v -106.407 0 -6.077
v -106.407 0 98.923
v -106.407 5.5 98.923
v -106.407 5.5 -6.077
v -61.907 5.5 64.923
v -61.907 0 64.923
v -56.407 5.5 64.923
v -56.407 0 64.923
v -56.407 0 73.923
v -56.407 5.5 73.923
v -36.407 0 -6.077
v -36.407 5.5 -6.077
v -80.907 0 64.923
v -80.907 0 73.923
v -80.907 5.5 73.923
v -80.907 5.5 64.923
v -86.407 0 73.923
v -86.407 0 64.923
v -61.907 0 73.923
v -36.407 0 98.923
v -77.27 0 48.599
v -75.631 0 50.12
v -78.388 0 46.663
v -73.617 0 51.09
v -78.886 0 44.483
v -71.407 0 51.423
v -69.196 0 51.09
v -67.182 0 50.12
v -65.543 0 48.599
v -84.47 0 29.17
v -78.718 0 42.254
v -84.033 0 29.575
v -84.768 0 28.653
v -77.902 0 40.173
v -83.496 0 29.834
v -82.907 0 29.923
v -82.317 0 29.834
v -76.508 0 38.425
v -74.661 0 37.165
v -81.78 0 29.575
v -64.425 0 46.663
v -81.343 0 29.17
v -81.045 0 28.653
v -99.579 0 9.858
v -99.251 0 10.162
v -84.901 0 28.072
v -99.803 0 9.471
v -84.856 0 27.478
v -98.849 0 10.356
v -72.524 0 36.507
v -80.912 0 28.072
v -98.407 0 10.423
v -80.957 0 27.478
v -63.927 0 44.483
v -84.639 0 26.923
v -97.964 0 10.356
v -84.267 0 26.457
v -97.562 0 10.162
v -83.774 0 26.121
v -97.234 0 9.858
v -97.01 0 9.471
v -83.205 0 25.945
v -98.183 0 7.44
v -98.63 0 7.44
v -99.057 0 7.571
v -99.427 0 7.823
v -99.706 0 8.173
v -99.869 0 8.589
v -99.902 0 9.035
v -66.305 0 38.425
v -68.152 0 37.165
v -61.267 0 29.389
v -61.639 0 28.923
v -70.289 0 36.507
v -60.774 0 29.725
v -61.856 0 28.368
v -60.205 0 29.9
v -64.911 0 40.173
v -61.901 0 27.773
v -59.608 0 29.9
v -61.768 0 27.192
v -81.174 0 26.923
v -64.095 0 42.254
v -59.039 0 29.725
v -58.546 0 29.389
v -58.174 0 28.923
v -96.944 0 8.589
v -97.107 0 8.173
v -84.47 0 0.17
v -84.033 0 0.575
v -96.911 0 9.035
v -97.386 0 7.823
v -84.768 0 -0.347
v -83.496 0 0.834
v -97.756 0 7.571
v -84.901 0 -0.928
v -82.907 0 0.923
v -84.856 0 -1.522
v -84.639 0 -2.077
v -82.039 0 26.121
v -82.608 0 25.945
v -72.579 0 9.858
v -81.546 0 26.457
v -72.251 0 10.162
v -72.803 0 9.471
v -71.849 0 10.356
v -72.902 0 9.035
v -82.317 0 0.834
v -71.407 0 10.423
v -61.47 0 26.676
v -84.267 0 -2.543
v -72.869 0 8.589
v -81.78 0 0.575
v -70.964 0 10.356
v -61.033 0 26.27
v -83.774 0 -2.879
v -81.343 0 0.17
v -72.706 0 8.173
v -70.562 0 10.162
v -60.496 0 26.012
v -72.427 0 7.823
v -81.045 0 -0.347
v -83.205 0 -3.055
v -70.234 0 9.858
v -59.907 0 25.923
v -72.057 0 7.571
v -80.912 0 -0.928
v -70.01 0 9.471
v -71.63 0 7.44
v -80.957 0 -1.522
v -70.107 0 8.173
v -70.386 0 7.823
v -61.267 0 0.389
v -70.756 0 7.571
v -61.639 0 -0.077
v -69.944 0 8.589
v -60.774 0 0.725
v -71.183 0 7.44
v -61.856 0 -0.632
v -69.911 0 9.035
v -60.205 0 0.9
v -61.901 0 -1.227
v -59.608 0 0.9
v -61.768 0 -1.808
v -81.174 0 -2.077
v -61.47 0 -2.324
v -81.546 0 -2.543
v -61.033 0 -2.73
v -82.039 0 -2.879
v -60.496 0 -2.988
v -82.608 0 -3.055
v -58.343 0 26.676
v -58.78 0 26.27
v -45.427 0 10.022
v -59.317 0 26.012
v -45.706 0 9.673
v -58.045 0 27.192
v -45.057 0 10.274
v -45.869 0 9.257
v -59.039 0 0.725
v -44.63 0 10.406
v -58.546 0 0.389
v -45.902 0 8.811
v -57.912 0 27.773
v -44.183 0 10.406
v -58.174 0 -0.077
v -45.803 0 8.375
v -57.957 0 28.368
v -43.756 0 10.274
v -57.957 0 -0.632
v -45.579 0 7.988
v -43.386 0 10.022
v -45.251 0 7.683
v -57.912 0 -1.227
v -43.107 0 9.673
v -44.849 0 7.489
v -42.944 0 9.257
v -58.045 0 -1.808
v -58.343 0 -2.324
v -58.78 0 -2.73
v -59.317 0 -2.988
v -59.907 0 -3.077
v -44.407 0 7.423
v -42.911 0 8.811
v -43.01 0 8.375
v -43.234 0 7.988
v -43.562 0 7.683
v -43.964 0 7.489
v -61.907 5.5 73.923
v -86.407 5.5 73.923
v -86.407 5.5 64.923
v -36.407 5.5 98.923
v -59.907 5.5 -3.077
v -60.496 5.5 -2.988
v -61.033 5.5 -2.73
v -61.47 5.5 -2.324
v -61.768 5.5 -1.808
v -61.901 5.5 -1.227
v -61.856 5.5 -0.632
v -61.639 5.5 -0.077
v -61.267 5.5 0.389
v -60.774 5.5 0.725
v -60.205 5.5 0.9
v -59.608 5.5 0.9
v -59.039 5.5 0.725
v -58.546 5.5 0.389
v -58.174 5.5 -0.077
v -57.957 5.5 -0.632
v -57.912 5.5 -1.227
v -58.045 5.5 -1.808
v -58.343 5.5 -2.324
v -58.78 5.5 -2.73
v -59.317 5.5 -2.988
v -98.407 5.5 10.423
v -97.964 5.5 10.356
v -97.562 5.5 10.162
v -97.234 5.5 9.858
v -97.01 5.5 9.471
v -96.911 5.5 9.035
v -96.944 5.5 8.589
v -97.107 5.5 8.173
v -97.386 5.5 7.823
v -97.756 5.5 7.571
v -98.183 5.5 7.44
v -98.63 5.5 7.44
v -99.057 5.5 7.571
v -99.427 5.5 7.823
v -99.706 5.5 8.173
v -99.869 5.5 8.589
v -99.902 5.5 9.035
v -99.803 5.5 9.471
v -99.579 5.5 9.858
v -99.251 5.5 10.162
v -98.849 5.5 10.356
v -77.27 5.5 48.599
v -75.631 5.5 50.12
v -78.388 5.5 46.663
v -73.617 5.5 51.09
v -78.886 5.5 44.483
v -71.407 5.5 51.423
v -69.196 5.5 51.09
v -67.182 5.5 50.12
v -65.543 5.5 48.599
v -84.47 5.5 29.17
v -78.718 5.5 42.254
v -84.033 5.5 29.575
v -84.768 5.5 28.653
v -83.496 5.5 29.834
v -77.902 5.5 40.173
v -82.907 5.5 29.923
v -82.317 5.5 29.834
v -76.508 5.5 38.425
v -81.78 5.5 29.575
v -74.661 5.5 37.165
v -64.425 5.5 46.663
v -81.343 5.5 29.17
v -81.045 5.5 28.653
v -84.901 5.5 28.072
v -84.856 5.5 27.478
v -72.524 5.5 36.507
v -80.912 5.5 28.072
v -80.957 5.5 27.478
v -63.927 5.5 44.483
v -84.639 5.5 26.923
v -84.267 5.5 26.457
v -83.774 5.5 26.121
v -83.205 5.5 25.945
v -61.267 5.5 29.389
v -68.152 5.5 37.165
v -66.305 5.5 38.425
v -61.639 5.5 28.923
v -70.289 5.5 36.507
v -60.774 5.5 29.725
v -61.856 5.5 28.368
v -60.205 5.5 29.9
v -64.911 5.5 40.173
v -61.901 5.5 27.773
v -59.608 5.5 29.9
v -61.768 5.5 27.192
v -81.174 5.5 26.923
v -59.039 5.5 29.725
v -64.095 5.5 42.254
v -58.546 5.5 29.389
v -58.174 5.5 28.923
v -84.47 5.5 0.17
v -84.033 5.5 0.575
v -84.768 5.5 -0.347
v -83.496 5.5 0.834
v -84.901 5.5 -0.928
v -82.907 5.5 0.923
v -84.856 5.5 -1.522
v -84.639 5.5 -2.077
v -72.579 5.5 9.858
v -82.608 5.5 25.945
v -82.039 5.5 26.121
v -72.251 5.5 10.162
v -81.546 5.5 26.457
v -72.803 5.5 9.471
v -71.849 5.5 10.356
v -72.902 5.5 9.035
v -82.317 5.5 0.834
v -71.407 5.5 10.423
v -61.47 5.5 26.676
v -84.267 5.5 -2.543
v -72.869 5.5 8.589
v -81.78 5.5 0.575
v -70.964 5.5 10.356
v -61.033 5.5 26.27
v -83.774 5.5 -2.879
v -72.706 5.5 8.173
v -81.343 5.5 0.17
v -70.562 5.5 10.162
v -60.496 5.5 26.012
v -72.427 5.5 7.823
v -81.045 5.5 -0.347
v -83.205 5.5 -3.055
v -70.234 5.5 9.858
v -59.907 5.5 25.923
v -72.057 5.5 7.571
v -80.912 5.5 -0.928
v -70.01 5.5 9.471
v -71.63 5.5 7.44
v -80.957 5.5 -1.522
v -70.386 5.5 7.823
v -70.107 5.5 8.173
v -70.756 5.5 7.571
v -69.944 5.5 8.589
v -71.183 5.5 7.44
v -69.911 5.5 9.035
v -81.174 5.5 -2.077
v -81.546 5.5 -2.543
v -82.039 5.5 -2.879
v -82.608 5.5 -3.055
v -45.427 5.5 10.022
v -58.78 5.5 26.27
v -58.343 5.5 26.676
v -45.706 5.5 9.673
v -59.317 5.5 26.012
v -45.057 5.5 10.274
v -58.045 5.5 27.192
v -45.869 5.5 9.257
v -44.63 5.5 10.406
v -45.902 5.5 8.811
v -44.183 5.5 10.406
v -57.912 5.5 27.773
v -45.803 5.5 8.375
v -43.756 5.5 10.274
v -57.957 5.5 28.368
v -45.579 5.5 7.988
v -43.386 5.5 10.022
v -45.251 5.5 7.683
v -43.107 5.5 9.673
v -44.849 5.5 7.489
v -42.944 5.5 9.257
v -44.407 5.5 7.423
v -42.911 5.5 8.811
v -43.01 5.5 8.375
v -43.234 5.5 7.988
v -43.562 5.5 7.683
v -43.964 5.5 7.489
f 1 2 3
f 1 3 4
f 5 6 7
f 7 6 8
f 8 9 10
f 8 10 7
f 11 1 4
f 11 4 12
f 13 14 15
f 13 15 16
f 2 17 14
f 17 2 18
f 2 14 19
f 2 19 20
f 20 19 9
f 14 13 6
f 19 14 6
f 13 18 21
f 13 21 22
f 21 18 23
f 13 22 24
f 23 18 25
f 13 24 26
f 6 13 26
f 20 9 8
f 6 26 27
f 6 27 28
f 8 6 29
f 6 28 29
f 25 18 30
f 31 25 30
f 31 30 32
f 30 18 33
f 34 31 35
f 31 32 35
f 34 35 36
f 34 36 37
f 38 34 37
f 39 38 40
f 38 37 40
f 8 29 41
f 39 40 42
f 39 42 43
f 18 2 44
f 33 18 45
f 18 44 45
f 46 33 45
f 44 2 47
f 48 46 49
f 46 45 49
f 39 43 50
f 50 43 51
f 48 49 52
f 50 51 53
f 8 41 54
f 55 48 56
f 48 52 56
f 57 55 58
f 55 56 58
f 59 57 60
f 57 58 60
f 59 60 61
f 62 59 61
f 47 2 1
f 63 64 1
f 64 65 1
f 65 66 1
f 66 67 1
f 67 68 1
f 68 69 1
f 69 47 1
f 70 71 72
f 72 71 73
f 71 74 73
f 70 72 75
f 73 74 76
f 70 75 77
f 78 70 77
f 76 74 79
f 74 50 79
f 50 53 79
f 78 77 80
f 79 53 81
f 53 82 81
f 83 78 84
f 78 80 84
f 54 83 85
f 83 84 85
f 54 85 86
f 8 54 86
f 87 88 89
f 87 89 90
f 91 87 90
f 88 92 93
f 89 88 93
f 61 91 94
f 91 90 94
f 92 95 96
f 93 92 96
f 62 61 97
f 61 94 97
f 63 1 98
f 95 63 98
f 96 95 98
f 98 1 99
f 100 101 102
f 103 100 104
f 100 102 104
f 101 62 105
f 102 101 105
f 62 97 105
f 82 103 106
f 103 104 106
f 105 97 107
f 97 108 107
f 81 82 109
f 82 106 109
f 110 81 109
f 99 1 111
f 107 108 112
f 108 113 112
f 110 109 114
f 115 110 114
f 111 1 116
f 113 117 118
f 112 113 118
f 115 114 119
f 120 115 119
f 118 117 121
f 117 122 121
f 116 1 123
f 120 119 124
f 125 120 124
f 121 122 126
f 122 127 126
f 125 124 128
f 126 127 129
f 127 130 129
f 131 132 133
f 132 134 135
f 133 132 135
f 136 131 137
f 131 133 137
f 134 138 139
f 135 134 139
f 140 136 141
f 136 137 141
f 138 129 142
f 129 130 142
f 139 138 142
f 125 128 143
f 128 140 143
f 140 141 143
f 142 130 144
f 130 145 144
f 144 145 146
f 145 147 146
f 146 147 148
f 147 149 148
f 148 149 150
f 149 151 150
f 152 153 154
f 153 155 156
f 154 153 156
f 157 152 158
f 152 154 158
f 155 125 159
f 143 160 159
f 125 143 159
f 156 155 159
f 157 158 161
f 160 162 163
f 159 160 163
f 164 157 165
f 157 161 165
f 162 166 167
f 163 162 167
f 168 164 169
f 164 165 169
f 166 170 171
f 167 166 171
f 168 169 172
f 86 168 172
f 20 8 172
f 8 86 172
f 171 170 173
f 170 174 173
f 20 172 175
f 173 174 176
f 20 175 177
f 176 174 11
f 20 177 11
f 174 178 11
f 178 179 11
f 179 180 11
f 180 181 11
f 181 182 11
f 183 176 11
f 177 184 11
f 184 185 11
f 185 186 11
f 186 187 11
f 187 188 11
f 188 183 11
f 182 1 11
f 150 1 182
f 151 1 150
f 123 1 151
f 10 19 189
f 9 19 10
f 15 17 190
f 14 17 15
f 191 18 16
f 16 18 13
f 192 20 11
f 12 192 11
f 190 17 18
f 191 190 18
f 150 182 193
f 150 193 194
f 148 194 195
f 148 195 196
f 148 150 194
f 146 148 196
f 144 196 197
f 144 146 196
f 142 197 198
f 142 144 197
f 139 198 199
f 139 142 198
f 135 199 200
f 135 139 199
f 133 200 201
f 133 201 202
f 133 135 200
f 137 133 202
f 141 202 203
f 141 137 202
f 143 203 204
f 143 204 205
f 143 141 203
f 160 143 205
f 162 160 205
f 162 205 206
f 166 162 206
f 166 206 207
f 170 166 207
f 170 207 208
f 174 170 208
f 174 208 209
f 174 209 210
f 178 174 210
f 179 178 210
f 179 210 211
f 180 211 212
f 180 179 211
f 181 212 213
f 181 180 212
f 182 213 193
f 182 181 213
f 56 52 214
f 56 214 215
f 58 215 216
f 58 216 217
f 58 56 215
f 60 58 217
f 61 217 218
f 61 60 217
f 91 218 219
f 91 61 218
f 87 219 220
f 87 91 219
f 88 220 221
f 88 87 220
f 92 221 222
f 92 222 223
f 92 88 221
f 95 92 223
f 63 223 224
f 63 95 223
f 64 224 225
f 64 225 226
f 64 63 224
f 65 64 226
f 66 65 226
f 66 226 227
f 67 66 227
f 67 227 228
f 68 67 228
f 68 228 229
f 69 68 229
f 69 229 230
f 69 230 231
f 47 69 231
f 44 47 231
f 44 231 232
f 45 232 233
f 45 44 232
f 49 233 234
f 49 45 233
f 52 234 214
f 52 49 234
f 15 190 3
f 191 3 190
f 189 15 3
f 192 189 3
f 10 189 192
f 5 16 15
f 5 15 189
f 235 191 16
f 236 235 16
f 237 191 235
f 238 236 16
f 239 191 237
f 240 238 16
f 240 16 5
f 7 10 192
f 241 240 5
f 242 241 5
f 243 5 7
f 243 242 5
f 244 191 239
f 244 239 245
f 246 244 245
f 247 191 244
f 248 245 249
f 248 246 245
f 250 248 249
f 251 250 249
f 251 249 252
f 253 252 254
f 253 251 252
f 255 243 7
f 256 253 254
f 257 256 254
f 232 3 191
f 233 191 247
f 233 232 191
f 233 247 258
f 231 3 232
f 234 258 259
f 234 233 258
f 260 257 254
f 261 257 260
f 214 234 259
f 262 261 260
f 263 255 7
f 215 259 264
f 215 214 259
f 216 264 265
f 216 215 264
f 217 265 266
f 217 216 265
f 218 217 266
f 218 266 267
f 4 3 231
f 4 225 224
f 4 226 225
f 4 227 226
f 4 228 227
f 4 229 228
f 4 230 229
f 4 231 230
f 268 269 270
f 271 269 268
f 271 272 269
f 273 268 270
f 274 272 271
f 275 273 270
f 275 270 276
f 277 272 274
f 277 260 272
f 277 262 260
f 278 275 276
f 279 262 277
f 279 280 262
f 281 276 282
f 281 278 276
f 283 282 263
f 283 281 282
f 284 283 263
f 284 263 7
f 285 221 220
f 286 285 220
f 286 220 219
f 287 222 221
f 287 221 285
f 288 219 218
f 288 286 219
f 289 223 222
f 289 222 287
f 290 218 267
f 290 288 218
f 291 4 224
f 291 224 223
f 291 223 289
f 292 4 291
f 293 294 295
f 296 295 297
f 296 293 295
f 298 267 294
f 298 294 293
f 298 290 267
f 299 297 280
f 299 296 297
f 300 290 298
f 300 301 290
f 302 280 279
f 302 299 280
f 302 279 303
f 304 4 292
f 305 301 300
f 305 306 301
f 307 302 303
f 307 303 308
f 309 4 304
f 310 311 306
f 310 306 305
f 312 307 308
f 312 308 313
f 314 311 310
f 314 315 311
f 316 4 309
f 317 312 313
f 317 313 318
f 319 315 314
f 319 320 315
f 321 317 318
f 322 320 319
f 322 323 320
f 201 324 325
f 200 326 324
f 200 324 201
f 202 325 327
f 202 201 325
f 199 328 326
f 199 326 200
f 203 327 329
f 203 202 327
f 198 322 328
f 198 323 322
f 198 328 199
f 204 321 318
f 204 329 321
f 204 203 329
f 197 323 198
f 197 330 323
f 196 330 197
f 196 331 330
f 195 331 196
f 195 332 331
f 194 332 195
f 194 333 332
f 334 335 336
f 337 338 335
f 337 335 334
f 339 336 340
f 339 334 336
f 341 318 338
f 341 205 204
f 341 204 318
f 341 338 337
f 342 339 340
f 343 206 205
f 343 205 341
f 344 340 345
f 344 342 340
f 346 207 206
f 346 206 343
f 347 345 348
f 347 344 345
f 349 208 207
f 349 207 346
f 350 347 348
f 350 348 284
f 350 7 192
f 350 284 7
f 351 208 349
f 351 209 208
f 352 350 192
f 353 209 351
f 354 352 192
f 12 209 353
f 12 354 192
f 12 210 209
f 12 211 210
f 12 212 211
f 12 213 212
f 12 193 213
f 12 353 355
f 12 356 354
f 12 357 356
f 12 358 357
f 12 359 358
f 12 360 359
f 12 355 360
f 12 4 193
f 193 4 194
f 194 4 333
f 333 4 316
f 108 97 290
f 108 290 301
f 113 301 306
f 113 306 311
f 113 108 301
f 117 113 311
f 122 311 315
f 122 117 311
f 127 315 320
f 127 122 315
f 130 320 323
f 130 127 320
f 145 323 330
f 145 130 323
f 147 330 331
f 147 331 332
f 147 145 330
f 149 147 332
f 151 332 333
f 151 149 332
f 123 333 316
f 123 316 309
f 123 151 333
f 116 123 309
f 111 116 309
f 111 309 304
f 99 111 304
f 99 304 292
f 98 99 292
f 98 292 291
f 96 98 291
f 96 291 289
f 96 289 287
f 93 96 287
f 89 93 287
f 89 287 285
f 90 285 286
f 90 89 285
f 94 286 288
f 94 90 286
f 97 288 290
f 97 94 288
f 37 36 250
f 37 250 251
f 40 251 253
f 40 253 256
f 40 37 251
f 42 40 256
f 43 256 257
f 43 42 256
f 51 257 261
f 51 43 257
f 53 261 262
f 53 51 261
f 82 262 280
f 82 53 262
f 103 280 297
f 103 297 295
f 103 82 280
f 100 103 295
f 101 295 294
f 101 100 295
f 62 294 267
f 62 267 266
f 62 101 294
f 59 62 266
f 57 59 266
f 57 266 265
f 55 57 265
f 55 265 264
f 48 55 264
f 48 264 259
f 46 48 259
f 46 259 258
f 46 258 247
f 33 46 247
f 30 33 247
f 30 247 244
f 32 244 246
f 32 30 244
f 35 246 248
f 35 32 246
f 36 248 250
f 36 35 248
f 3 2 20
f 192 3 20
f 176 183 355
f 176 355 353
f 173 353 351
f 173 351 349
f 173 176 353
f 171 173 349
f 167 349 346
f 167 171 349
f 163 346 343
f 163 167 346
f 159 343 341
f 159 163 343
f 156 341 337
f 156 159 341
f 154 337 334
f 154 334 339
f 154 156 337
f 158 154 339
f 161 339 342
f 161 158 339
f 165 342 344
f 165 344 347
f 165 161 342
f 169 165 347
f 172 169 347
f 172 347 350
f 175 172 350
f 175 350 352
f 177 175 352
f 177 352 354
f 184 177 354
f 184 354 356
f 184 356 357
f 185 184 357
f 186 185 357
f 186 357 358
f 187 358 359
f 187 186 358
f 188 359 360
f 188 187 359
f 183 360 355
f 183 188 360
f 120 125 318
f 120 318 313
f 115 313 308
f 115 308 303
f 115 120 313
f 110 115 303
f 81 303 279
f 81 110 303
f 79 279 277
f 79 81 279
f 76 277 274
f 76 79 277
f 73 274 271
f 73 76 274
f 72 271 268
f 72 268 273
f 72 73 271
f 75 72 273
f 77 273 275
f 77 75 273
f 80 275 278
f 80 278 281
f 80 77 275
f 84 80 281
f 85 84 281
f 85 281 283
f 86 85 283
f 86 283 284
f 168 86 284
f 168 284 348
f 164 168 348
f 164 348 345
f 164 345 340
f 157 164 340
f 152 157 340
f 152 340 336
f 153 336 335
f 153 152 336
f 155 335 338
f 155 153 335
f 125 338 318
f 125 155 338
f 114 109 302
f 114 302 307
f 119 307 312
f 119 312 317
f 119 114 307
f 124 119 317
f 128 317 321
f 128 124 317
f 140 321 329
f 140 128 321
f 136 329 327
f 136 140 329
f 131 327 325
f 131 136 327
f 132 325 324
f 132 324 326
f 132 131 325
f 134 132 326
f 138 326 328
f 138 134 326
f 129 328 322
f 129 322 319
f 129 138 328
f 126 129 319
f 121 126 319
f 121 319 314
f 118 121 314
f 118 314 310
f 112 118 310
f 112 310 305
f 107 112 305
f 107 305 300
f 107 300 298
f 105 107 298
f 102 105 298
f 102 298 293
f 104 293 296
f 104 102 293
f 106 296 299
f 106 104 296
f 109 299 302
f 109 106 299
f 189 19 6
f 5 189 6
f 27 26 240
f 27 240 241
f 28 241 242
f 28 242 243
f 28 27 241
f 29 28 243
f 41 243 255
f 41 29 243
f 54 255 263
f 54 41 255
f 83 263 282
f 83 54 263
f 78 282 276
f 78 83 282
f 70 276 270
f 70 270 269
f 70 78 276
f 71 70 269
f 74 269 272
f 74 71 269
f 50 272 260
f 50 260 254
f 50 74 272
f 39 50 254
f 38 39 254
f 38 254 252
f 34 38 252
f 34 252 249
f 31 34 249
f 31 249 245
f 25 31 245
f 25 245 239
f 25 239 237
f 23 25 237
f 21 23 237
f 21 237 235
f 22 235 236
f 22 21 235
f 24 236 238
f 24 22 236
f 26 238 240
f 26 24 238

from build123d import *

# Parameters (mm, degrees)
CROQUIS1_W              = 70
CROQUIS1_H              = 105
CROQUIS1_R              = 2
CROQUIS1_R_2            = 7.5
CROQUIS1_R_3            = 1.5
CROQUIS1_W_2            = 5.5
CROQUIS1_H_2            = 9
SALIENTE_EXTRUIR1_DEPTH = 5.5


with BuildPart() as part:
    # Croquis1 → Saliente-Extruir1 (new body)
    with BuildSketch(Plane(origin=(0, 0, 0), x_dir=(1, 0, 0), z_dir=(0, 1, 0))):
        with Locations((-71.406504065, -46.422764228)):
            Rectangle(CROQUIS1_W, CROQUIS1_H)
        with Locations(Location((-82.906504065, 1.077235772, 0), (0, 0, 270))):
            Circle(CROQUIS1_R, mode=Mode.SUBTRACT)
        with Locations(Location((-82.906504065, -27.922764228, 0), (0, 0, 270))):
            Circle(CROQUIS1_R, mode=Mode.SUBTRACT)
        with Locations(Location((-71.406504065, -43.922764228, 0), (0, 0, 270))):
            Circle(CROQUIS1_R_2, mode=Mode.SUBTRACT)
        with Locations(Location((-71.406504065, -8.922764228, 0), (0, 0, 270))):
            Circle(CROQUIS1_R_3, mode=Mode.SUBTRACT)
        with Locations(Location((-59.906504065, -27.922764228, 0), (0, 0, 90))):
            Circle(CROQUIS1_R, mode=Mode.SUBTRACT)
        with Locations(Location((-59.906504065, 1.077235772, 0), (0, 0, 90))):
            Circle(CROQUIS1_R, mode=Mode.SUBTRACT)
        with Locations(Location((-98.406504065, -8.922764228, 0), (0, 0, 270))):
            Circle(CROQUIS1_R_3, mode=Mode.SUBTRACT)
        with Locations(Location((-44.406504065, -8.922764228, 0), (0, 0, 90))):
            Circle(CROQUIS1_R_3, mode=Mode.SUBTRACT)
        with Locations((-83.656504065, -69.422764228)):
            Rectangle(CROQUIS1_W_2, CROQUIS1_H_2, mode=Mode.SUBTRACT)
        with Locations((-59.156504065, -69.422764228)):
            Rectangle(CROQUIS1_W_2, CROQUIS1_H_2, mode=Mode.SUBTRACT)
    extrude(amount=SALIENTE_EXTRUIR1_DEPTH)


solid = part.part
